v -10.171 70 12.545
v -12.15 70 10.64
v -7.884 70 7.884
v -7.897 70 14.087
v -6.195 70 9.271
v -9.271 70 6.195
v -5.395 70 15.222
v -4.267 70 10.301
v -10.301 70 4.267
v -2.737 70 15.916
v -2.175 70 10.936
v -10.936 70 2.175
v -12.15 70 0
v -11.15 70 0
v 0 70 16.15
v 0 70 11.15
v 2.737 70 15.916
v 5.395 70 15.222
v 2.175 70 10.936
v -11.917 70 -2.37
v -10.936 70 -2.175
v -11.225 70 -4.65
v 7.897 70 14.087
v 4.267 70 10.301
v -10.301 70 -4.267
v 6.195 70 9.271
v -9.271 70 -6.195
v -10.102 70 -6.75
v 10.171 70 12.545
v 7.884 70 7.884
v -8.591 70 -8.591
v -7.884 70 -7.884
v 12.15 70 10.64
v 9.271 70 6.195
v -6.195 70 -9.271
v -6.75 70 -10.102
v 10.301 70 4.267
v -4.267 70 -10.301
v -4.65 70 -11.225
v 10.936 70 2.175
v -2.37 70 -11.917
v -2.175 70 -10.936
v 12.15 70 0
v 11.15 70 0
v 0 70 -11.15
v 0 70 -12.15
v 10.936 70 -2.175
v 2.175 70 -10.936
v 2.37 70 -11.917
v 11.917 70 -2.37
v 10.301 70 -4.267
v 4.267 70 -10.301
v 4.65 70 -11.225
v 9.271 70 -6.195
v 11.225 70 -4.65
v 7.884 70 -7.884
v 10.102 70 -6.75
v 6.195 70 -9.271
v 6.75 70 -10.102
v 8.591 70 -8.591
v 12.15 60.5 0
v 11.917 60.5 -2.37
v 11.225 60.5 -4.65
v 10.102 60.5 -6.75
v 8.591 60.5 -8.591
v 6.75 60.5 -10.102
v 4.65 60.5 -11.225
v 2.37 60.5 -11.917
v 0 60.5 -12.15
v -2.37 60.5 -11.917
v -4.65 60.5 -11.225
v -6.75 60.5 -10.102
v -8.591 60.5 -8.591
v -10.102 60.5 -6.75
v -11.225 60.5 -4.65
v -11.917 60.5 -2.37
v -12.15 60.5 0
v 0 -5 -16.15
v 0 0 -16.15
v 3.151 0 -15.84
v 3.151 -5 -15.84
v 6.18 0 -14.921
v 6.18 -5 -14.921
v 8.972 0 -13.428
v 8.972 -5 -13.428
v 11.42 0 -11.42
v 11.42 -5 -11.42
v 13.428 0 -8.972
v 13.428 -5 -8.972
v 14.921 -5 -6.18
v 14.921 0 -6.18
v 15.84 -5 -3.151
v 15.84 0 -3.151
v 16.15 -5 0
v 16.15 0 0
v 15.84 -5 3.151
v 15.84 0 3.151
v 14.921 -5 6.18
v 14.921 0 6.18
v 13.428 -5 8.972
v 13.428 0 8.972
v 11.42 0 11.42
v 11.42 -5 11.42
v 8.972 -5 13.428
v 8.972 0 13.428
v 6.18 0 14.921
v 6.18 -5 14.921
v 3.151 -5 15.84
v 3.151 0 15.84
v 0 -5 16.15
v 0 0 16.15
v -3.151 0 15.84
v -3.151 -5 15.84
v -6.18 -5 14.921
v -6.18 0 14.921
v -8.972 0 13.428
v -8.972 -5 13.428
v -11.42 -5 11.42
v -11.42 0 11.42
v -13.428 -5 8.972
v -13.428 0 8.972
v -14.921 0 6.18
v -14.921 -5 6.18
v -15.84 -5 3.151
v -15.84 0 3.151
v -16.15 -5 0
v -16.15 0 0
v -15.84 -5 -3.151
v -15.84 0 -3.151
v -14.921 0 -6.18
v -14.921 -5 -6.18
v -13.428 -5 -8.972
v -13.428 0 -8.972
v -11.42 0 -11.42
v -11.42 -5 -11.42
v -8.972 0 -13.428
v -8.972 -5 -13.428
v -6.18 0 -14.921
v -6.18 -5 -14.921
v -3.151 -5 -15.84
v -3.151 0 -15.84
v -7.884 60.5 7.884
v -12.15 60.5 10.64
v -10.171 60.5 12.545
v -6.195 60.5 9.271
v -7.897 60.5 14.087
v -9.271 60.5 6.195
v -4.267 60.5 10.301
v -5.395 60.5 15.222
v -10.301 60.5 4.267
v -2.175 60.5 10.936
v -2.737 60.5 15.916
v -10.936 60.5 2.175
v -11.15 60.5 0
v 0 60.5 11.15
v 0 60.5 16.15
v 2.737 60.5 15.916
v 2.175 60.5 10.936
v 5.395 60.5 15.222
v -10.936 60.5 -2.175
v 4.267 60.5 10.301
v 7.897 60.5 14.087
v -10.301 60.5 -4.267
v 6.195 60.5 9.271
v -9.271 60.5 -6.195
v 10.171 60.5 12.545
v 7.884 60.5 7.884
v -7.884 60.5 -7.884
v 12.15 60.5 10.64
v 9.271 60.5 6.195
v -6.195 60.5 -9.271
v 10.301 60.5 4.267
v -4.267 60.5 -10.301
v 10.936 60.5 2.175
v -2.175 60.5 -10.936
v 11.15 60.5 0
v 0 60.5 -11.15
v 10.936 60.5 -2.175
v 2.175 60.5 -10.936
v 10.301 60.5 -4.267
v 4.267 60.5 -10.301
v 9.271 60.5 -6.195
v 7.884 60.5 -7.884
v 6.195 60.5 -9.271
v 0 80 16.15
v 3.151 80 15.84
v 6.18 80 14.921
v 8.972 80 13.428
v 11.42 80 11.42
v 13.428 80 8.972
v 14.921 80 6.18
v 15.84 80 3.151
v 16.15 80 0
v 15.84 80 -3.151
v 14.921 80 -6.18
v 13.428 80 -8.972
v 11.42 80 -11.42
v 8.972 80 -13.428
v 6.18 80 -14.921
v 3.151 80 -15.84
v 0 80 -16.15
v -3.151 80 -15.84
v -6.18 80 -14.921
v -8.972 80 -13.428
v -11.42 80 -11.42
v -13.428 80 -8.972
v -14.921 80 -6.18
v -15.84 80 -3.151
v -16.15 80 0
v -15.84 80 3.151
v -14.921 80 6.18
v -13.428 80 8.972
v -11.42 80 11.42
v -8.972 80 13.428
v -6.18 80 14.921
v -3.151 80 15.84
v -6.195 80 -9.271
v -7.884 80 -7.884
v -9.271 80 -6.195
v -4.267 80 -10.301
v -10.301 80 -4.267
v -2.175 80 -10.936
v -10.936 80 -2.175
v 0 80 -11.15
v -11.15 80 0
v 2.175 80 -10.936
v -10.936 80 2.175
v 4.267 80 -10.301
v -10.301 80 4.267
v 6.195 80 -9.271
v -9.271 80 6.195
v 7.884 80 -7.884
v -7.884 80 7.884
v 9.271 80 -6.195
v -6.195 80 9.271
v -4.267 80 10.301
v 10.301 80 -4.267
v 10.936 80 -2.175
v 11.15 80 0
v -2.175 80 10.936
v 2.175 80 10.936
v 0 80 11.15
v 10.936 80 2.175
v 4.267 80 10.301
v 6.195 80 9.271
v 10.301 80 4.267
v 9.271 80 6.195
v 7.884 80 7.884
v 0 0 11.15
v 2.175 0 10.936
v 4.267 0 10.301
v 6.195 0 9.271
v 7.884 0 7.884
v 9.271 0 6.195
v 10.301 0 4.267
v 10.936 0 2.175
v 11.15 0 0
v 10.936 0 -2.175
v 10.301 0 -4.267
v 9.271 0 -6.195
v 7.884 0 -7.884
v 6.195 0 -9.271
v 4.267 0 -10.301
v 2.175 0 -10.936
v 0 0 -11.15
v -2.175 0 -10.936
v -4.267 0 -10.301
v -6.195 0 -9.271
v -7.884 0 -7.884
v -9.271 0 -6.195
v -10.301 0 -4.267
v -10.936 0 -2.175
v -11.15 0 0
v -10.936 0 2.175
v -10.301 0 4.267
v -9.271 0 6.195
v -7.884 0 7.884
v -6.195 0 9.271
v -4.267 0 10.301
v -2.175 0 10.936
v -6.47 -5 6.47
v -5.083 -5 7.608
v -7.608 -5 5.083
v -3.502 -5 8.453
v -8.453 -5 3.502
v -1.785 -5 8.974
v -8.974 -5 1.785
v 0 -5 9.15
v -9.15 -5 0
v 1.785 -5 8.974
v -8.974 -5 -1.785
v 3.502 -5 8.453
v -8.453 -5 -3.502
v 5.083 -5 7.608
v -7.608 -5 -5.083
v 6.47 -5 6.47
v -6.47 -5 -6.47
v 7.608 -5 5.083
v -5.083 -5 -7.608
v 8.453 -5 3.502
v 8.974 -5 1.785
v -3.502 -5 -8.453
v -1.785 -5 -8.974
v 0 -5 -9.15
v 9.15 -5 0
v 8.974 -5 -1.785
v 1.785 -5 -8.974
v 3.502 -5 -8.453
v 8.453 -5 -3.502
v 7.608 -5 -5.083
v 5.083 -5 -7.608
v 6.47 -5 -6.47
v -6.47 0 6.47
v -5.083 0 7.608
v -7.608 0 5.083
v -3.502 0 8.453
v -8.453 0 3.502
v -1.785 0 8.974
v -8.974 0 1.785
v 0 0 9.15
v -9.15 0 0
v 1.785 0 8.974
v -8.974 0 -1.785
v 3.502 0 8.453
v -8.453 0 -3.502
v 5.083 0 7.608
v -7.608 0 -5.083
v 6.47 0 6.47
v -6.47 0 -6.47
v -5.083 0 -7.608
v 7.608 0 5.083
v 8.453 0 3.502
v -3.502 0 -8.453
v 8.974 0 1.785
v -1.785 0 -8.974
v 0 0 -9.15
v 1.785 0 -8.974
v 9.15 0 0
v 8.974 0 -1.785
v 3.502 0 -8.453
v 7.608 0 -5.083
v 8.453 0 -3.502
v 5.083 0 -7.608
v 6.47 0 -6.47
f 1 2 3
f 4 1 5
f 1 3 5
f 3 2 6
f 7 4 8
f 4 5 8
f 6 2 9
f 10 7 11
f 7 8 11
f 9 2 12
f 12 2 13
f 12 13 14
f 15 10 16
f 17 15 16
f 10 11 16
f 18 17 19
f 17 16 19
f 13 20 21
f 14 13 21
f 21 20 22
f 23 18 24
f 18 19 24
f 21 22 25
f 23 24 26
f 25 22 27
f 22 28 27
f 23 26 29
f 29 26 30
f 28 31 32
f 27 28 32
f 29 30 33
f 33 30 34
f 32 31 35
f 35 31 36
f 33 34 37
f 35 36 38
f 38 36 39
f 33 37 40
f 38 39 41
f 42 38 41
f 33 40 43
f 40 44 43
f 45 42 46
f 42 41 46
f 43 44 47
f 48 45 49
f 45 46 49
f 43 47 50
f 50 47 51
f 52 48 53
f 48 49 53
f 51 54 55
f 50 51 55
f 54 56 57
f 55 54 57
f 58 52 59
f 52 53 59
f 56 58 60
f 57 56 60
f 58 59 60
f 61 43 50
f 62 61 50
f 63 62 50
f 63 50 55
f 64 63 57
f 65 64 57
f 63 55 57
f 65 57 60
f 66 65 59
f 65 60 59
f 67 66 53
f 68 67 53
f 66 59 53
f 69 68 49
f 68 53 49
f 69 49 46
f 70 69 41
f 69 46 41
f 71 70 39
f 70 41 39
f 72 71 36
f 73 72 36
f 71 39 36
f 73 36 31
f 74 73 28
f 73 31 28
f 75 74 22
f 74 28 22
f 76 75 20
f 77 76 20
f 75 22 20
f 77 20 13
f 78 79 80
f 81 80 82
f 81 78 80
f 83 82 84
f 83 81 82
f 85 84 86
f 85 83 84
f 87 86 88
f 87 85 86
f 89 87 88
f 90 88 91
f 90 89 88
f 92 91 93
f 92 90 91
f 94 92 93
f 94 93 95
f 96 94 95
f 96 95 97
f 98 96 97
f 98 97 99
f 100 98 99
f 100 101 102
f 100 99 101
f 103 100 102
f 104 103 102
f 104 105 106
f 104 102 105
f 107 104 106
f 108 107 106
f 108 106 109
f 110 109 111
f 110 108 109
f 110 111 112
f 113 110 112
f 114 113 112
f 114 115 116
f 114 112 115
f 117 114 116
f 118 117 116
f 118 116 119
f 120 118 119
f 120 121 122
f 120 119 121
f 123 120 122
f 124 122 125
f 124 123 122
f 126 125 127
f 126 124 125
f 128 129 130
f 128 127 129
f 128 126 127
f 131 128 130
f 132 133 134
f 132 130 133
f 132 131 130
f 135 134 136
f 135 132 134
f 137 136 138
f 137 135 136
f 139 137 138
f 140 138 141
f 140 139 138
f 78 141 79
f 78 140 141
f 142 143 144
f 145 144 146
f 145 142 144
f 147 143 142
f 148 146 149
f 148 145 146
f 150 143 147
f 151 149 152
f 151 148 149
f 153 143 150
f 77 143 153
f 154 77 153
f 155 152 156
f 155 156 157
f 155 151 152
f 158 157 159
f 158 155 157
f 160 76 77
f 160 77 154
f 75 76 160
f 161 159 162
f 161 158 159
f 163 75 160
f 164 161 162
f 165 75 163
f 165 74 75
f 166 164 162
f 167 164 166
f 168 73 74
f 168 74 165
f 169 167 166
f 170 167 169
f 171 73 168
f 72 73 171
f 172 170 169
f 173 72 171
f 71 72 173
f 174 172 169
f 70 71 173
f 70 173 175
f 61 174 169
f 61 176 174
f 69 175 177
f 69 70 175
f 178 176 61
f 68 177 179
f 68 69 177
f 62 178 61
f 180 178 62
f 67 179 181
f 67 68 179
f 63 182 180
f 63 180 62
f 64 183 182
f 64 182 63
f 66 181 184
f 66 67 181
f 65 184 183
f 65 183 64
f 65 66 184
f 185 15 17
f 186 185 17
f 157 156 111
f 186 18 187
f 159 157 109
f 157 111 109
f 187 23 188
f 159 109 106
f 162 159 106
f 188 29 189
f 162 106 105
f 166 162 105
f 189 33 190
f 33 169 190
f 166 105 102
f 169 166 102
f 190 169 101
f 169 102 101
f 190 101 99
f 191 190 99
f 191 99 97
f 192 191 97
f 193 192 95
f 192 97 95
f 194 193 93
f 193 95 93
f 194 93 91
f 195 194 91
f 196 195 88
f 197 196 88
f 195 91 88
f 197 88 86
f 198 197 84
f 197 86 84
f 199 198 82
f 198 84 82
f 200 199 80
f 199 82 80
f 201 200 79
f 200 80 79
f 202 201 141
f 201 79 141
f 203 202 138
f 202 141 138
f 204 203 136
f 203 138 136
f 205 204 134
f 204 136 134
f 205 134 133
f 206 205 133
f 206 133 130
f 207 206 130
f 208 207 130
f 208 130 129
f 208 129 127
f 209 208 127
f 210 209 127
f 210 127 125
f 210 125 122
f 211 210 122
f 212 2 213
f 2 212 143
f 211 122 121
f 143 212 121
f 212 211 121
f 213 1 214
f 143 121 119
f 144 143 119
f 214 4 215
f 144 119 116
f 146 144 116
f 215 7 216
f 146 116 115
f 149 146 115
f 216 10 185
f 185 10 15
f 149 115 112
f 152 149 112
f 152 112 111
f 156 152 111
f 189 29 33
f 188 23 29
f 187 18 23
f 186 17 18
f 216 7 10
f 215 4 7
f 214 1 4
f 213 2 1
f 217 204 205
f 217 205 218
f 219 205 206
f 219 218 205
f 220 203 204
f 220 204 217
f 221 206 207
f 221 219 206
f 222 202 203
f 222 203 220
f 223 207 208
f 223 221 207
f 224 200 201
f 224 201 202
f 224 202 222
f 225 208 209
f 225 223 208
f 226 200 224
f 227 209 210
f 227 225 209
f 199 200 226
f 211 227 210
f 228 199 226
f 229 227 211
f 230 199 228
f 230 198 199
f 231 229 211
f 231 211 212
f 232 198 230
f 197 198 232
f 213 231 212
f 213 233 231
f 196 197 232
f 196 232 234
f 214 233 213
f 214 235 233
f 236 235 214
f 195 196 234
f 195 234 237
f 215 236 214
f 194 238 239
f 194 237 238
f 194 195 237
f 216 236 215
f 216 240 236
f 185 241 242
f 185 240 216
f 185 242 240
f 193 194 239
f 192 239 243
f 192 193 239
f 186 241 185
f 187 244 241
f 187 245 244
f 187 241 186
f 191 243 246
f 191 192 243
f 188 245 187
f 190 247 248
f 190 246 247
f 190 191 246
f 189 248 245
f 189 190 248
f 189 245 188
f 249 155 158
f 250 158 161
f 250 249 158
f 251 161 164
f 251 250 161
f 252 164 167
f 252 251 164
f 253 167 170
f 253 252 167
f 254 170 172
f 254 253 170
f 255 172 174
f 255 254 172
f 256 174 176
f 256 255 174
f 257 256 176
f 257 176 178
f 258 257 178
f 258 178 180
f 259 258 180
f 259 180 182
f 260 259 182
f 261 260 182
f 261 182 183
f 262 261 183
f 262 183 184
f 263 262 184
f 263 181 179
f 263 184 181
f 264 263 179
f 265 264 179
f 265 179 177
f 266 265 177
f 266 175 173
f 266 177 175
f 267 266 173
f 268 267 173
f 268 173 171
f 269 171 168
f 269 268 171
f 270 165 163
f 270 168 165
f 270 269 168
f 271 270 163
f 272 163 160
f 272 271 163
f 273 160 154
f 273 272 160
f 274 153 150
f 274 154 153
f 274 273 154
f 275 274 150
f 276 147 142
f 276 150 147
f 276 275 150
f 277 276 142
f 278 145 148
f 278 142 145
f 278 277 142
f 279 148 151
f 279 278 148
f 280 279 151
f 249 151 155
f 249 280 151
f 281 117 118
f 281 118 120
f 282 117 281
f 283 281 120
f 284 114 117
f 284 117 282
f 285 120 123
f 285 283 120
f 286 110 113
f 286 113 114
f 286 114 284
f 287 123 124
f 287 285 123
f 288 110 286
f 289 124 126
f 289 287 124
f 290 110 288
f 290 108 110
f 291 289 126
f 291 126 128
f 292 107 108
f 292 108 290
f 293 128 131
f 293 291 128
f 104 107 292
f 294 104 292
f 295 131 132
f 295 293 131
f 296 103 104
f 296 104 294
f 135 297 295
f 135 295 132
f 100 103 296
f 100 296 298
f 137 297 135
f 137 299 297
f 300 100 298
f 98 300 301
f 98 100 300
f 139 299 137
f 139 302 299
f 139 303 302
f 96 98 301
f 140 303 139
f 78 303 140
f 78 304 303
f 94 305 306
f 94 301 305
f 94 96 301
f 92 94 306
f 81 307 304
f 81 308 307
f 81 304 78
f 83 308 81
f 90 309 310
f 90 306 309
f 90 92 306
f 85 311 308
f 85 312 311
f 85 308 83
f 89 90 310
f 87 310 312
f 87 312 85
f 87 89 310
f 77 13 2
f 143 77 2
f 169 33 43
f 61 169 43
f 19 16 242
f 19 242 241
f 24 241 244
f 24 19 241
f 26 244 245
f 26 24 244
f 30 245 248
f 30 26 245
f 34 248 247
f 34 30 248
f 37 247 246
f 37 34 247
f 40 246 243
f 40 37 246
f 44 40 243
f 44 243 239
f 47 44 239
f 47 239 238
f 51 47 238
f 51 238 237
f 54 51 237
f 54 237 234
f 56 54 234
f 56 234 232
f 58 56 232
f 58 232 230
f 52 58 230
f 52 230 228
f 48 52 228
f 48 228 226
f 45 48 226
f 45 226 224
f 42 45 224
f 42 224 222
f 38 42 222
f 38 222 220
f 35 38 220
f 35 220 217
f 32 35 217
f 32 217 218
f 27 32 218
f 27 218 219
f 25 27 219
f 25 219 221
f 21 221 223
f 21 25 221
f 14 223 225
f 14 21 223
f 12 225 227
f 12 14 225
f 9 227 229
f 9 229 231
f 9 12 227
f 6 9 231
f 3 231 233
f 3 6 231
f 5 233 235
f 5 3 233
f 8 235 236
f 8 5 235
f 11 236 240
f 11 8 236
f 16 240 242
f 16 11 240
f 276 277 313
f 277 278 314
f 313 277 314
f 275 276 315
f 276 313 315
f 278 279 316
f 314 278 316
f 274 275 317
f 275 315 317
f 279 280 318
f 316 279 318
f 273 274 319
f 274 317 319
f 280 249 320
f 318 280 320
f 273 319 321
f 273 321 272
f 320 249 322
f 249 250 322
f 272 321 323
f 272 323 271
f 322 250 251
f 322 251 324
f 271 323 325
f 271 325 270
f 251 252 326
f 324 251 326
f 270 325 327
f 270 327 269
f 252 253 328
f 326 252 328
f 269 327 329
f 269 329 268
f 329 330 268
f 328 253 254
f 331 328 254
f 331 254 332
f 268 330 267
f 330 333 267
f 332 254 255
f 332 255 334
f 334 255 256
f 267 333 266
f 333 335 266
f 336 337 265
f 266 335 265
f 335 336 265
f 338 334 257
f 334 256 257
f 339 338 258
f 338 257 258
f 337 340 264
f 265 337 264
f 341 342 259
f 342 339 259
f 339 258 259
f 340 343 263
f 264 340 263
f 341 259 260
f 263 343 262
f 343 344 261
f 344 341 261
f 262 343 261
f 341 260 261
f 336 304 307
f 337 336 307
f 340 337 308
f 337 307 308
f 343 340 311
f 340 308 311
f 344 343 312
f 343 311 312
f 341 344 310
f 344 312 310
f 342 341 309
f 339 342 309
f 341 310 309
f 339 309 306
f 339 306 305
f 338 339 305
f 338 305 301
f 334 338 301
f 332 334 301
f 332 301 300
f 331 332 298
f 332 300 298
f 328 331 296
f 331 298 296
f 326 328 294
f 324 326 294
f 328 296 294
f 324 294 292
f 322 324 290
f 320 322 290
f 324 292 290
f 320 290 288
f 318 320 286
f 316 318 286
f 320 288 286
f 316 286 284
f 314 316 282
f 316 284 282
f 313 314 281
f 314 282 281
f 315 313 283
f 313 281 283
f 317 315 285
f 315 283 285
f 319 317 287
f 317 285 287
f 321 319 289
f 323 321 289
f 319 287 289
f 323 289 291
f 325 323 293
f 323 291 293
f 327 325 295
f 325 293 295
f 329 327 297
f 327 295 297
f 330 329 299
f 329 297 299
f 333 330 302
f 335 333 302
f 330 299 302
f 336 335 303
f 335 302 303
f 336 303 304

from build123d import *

# Parameters (mm, degrees)
SKETCH1_R           = 16.15
SKETCH1_R_2         = 11.15
BOSS_EXTRUDE1_DEPTH = 80
BOSS_EXTRUDE2_START = 5
SKETCH2_R           = 16.15
SKETCH2_R_2         = 9.15
BOSS_EXTRUDE2_DEPTH = 5
CUT_EXTRUDE1_DEPTH  = 9.5


with BuildPart() as part:
    # Sketch1 → Boss-Extrude1 (new body)
    with BuildSketch(Plane(origin=(0, 0, 0), x_dir=(1, 0, 0), z_dir=(0, 1, 0))):
        with Locations(Location((0, 0, 0), (0, 0, 270))):
            Circle(SKETCH1_R)
        with Locations(Location((0, 0, 0), (0, 0, 270))):
            Circle(SKETCH1_R_2, mode=Mode.SUBTRACT)
    extrude(amount=BOSS_EXTRUDE1_DEPTH)

    # Sketch2 → Boss-Extrude2 (add)
    with BuildSketch(Plane.XZ.offset(BOSS_EXTRUDE2_START)):
        with Locations(Location((0, 0, 0), (0, 0, 270))):
            Circle(SKETCH2_R)
        with Locations(Location((0, 0, 0), (0, 0, 270))):
            Circle(SKETCH2_R_2, mode=Mode.SUBTRACT)
    extrude(amount=-BOSS_EXTRUDE2_DEPTH)

    # Sketch4 → Cut-Extrude1 (cut)
    with BuildSketch(Plane(origin=(0, 70, 0), x_dir=(1, 0, 0), z_dir=(0, 1, 0))):
        with BuildLine():
            Line((-12.15, 0), (-12.15, -18.126783329))
            Line((-12.15, -18.126783329), (12.15, -18.126783329))
            Line((12.15, -18.126783329), (12.15, 0))
            ThreePointArc((12.15, 0), (0, 12.15), (-12.15, 0))
        make_face()
    extrude(amount=-CUT_EXTRUDE1_DEPTH, mode=Mode.SUBTRACT)


solid = part.part
